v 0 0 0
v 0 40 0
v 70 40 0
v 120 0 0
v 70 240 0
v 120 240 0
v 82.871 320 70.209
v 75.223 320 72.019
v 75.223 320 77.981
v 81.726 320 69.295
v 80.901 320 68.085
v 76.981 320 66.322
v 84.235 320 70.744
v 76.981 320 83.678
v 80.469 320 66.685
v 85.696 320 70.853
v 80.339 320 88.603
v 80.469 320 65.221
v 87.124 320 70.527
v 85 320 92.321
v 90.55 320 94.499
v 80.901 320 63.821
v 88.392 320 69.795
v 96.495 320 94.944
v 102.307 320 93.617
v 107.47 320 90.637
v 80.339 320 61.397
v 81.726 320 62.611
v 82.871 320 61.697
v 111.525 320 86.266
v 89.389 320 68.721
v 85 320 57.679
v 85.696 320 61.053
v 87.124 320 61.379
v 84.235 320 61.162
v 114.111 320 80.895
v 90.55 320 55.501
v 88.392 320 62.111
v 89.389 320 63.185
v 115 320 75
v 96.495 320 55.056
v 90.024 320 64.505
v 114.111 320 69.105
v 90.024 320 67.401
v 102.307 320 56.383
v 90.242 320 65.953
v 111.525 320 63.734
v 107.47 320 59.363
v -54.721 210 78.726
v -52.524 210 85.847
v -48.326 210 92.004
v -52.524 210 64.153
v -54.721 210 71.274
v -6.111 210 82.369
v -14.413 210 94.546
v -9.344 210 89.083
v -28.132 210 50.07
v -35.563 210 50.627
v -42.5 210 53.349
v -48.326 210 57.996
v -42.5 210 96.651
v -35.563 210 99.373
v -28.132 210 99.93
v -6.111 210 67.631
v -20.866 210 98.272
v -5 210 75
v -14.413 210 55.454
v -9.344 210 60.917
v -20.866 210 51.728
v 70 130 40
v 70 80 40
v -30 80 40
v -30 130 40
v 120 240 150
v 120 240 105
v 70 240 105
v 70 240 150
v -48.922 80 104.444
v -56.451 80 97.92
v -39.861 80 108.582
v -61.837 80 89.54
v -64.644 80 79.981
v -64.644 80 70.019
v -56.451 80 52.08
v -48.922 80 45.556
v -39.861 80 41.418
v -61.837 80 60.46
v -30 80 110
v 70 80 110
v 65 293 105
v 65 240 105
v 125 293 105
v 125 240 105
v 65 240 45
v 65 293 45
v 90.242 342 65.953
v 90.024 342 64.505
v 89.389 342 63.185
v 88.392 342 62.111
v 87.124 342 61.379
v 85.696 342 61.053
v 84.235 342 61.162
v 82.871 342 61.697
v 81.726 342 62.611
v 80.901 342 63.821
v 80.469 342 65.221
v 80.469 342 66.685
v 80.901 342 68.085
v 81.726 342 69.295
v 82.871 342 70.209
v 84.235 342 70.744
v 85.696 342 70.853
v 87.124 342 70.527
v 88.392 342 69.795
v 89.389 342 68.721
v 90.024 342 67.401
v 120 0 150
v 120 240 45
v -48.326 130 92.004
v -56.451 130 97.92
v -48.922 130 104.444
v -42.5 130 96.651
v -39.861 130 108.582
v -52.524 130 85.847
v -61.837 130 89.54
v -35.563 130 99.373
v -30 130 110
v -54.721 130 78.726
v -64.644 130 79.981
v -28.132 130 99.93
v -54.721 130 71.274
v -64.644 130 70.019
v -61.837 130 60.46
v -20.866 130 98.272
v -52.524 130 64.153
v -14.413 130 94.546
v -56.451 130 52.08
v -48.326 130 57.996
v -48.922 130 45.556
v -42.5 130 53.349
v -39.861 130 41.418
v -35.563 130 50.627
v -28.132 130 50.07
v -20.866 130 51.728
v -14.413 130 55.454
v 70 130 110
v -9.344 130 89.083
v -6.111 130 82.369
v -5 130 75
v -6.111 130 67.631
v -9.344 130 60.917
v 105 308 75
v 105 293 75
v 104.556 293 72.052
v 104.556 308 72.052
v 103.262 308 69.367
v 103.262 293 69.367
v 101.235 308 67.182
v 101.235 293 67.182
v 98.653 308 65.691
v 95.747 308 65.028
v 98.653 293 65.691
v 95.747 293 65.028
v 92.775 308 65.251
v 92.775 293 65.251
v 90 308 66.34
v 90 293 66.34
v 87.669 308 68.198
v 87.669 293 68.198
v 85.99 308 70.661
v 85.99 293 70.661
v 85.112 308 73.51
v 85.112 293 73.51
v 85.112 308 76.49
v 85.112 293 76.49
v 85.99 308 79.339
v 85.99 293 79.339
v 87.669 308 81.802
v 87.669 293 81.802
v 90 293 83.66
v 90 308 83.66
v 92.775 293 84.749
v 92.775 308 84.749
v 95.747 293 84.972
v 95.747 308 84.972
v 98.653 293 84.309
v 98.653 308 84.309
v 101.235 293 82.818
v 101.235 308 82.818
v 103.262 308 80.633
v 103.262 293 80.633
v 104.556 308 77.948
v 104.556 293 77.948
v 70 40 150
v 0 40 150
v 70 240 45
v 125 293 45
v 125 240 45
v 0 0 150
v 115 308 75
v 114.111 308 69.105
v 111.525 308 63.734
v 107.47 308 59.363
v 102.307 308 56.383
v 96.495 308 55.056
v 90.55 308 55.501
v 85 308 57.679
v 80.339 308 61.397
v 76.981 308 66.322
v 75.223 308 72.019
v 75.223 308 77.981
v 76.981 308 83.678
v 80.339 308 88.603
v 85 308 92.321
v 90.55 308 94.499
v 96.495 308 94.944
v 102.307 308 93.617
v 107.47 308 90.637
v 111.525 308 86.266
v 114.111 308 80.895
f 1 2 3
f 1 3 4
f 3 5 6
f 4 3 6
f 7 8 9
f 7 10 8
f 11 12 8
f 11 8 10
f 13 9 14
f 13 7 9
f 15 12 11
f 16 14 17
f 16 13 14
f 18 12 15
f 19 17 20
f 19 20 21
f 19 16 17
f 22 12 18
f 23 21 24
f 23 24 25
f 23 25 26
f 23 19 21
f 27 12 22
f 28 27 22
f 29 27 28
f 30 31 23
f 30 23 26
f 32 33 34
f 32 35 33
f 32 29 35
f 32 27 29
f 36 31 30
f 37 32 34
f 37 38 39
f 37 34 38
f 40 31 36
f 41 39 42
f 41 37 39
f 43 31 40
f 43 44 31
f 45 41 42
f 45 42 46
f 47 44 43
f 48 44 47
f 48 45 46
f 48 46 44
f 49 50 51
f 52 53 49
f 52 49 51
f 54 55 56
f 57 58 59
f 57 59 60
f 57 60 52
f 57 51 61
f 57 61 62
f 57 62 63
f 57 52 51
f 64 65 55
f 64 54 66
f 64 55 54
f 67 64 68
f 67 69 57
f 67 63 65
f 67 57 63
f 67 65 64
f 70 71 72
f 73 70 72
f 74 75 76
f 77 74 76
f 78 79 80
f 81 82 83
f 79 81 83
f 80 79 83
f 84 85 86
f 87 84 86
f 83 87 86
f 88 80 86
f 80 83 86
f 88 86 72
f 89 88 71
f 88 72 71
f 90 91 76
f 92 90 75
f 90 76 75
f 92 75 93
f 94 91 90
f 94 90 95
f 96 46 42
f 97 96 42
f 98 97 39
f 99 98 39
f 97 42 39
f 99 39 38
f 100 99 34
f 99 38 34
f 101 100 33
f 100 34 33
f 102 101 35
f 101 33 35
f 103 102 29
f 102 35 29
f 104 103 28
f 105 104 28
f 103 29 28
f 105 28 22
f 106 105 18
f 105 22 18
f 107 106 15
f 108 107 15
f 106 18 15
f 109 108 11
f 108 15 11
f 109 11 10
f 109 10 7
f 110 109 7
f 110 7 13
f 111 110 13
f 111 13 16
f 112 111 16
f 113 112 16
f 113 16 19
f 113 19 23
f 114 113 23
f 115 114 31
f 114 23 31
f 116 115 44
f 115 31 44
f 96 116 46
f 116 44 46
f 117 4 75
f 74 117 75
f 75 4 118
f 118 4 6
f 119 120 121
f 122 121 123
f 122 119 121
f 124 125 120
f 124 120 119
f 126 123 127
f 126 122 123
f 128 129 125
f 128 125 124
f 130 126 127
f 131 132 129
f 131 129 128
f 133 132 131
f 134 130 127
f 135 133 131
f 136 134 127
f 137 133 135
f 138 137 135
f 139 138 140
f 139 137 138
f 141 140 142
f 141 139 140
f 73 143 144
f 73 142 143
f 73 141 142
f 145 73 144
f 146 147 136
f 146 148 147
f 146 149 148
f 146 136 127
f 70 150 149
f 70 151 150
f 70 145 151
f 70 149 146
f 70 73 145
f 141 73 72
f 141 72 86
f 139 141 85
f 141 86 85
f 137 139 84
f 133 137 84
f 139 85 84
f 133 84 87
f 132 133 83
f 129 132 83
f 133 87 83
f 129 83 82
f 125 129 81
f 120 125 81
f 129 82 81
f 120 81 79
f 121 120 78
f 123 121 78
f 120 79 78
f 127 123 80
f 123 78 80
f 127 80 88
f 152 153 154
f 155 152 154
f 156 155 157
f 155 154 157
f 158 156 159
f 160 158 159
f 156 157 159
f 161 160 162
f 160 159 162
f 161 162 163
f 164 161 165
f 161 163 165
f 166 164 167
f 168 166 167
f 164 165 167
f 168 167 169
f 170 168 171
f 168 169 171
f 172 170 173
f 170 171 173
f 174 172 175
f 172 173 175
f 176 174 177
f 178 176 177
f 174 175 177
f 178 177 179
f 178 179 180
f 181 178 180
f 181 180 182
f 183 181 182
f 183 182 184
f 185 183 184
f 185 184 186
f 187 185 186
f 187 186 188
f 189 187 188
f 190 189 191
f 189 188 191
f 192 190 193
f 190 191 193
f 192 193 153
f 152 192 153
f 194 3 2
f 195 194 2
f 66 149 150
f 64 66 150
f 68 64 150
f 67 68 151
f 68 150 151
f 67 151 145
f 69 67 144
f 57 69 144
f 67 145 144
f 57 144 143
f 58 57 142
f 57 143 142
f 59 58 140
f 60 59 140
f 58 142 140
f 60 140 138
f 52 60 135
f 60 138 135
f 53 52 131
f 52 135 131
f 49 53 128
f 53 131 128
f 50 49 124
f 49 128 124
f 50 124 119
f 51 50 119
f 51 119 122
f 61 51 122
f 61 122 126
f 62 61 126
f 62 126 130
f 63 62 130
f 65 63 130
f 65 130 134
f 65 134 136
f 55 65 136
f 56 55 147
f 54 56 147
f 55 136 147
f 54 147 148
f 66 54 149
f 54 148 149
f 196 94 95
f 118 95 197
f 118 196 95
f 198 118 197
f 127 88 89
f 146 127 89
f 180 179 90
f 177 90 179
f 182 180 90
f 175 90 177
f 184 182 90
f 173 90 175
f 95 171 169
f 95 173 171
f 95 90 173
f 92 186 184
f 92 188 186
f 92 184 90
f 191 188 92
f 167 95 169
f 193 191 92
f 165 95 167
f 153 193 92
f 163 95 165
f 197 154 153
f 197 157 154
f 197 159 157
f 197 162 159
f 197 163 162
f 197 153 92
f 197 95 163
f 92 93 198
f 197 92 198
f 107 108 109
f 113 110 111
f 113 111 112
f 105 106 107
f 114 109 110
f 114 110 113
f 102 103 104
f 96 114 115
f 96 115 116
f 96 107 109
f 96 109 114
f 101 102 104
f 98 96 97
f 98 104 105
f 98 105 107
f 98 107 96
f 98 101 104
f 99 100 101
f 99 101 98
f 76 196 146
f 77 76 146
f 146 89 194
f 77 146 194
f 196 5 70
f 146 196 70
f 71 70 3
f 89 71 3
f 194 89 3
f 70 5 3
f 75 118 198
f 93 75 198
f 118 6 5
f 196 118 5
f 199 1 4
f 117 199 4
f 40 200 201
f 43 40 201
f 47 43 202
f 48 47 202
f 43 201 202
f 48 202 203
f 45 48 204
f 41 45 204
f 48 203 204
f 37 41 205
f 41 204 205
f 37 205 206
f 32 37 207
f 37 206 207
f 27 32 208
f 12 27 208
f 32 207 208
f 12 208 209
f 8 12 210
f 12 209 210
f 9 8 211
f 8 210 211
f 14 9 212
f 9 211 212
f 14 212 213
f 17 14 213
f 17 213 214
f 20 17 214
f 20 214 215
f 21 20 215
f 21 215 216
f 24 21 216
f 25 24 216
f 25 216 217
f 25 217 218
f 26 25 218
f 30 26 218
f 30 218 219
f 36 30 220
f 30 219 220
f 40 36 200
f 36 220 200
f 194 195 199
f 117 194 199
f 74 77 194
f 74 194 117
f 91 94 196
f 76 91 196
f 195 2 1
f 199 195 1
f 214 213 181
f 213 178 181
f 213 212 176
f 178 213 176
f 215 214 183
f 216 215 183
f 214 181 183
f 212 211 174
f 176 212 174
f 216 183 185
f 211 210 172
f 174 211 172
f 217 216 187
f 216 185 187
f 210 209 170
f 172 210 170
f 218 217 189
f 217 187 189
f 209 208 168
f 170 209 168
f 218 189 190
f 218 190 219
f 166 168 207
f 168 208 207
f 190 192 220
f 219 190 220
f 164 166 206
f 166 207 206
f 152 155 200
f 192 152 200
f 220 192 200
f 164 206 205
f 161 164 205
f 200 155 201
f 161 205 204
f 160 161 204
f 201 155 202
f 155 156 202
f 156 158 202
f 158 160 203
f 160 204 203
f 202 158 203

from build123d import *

# Parameters (mm, degrees)
EXTRUDE_1_DEPTH = 150
EXTRUDE_2_DEPTH = 50
SKETCH_4_R      = 25
EXTRUDE_3_DEPTH = 80
SKETCH_5_W      = 60
SKETCH_5_H      = 60
EXTRUDE_4_DEPTH = 53
SKETCH_6_R      = 10
EXTRUDE_5_DEPTH = 15
SKETCH_7_R      = 20
EXTRUDE_6_DEPTH = 12
SKETCH_8_R      = 4.914054778
EXTRUDE_7_DEPTH = 22


with BuildPart() as part:
    # ｽｹｯﾁ1 → ﾎﾞｽ - 押し出し1 (new body)
    with BuildSketch(Plane.XY):
        Polygon((0, 0), (120, 0), (120, 240), (70, 240), (70, 40), (0, 40), align=None)
    extrude(amount=EXTRUDE_1_DEPTH)

    # ｽｹｯﾁ3 → ﾎﾞｽ - 押し出し2 (add)
    with BuildSketch(Plane(origin=(0, 80, 0), x_dir=(1, 0, 0), z_dir=(0, 1, 0))):
        with BuildLine():
            Line((70, -40), (-30, -40))
            ThreePointArc((-30, -40), (-65, -75), (-30, -110))
            Line((-30, -110), (70, -110))
            Line((70, -110), (70, -40))
        make_face()
    extrude(amount=EXTRUDE_2_DEPTH)

    # ｽｹｯﾁ4 → ﾎﾞｽ - 押し出し3 (add)
    with BuildSketch(Plane(origin=(0, 130, 0), x_dir=(1, 0, 0), z_dir=(0, 1, 0))):
        with Locations((-29.999997022, -75)):
            Circle(SKETCH_4_R)
    extrude(amount=EXTRUDE_3_DEPTH)

    # ｽｹｯﾁ5 → ﾎﾞｽ - 押し出し4 (add)
    with BuildSketch(Plane(origin=(0, 240, 0), x_dir=(1, 0, 0), z_dir=(0, 1, 0))):
        with Locations((95, -75)):
            Rectangle(SKETCH_5_W, SKETCH_5_H)
    extrude(amount=EXTRUDE_4_DEPTH)

    # ｽｹｯﾁ6 → ﾎﾞｽ - 押し出し5 (add)
    with BuildSketch(Plane(origin=(0, 293, 0), x_dir=(1, 0, 0), z_dir=(0, 1, 0))):
        with Locations((95, -75)):
            Circle(SKETCH_6_R)
    extrude(amount=EXTRUDE_5_DEPTH)

    # ｽｹｯﾁ7 → ﾎﾞｽ - 押し出し6 (add)
    with BuildSketch(Plane(origin=(0, 308, 0), x_dir=(1, 0, 0), z_dir=(0, 1, 0))):
        with Locations((95, -75)):
            Circle(SKETCH_7_R)
    extrude(amount=EXTRUDE_6_DEPTH)

    # ｽｹｯﾁ8 → ﾎﾞｽ - 押し出し7 (add)
    with BuildSketch(Plane(origin=(0, 320, 0), x_dir=(1, 0, 0), z_dir=(0, 1, 0))):
        with Locations((85.328318408, -65.952959142)):
            Circle(SKETCH_8_R)
    extrude(amount=EXTRUDE_7_DEPTH)


solid = part.part
